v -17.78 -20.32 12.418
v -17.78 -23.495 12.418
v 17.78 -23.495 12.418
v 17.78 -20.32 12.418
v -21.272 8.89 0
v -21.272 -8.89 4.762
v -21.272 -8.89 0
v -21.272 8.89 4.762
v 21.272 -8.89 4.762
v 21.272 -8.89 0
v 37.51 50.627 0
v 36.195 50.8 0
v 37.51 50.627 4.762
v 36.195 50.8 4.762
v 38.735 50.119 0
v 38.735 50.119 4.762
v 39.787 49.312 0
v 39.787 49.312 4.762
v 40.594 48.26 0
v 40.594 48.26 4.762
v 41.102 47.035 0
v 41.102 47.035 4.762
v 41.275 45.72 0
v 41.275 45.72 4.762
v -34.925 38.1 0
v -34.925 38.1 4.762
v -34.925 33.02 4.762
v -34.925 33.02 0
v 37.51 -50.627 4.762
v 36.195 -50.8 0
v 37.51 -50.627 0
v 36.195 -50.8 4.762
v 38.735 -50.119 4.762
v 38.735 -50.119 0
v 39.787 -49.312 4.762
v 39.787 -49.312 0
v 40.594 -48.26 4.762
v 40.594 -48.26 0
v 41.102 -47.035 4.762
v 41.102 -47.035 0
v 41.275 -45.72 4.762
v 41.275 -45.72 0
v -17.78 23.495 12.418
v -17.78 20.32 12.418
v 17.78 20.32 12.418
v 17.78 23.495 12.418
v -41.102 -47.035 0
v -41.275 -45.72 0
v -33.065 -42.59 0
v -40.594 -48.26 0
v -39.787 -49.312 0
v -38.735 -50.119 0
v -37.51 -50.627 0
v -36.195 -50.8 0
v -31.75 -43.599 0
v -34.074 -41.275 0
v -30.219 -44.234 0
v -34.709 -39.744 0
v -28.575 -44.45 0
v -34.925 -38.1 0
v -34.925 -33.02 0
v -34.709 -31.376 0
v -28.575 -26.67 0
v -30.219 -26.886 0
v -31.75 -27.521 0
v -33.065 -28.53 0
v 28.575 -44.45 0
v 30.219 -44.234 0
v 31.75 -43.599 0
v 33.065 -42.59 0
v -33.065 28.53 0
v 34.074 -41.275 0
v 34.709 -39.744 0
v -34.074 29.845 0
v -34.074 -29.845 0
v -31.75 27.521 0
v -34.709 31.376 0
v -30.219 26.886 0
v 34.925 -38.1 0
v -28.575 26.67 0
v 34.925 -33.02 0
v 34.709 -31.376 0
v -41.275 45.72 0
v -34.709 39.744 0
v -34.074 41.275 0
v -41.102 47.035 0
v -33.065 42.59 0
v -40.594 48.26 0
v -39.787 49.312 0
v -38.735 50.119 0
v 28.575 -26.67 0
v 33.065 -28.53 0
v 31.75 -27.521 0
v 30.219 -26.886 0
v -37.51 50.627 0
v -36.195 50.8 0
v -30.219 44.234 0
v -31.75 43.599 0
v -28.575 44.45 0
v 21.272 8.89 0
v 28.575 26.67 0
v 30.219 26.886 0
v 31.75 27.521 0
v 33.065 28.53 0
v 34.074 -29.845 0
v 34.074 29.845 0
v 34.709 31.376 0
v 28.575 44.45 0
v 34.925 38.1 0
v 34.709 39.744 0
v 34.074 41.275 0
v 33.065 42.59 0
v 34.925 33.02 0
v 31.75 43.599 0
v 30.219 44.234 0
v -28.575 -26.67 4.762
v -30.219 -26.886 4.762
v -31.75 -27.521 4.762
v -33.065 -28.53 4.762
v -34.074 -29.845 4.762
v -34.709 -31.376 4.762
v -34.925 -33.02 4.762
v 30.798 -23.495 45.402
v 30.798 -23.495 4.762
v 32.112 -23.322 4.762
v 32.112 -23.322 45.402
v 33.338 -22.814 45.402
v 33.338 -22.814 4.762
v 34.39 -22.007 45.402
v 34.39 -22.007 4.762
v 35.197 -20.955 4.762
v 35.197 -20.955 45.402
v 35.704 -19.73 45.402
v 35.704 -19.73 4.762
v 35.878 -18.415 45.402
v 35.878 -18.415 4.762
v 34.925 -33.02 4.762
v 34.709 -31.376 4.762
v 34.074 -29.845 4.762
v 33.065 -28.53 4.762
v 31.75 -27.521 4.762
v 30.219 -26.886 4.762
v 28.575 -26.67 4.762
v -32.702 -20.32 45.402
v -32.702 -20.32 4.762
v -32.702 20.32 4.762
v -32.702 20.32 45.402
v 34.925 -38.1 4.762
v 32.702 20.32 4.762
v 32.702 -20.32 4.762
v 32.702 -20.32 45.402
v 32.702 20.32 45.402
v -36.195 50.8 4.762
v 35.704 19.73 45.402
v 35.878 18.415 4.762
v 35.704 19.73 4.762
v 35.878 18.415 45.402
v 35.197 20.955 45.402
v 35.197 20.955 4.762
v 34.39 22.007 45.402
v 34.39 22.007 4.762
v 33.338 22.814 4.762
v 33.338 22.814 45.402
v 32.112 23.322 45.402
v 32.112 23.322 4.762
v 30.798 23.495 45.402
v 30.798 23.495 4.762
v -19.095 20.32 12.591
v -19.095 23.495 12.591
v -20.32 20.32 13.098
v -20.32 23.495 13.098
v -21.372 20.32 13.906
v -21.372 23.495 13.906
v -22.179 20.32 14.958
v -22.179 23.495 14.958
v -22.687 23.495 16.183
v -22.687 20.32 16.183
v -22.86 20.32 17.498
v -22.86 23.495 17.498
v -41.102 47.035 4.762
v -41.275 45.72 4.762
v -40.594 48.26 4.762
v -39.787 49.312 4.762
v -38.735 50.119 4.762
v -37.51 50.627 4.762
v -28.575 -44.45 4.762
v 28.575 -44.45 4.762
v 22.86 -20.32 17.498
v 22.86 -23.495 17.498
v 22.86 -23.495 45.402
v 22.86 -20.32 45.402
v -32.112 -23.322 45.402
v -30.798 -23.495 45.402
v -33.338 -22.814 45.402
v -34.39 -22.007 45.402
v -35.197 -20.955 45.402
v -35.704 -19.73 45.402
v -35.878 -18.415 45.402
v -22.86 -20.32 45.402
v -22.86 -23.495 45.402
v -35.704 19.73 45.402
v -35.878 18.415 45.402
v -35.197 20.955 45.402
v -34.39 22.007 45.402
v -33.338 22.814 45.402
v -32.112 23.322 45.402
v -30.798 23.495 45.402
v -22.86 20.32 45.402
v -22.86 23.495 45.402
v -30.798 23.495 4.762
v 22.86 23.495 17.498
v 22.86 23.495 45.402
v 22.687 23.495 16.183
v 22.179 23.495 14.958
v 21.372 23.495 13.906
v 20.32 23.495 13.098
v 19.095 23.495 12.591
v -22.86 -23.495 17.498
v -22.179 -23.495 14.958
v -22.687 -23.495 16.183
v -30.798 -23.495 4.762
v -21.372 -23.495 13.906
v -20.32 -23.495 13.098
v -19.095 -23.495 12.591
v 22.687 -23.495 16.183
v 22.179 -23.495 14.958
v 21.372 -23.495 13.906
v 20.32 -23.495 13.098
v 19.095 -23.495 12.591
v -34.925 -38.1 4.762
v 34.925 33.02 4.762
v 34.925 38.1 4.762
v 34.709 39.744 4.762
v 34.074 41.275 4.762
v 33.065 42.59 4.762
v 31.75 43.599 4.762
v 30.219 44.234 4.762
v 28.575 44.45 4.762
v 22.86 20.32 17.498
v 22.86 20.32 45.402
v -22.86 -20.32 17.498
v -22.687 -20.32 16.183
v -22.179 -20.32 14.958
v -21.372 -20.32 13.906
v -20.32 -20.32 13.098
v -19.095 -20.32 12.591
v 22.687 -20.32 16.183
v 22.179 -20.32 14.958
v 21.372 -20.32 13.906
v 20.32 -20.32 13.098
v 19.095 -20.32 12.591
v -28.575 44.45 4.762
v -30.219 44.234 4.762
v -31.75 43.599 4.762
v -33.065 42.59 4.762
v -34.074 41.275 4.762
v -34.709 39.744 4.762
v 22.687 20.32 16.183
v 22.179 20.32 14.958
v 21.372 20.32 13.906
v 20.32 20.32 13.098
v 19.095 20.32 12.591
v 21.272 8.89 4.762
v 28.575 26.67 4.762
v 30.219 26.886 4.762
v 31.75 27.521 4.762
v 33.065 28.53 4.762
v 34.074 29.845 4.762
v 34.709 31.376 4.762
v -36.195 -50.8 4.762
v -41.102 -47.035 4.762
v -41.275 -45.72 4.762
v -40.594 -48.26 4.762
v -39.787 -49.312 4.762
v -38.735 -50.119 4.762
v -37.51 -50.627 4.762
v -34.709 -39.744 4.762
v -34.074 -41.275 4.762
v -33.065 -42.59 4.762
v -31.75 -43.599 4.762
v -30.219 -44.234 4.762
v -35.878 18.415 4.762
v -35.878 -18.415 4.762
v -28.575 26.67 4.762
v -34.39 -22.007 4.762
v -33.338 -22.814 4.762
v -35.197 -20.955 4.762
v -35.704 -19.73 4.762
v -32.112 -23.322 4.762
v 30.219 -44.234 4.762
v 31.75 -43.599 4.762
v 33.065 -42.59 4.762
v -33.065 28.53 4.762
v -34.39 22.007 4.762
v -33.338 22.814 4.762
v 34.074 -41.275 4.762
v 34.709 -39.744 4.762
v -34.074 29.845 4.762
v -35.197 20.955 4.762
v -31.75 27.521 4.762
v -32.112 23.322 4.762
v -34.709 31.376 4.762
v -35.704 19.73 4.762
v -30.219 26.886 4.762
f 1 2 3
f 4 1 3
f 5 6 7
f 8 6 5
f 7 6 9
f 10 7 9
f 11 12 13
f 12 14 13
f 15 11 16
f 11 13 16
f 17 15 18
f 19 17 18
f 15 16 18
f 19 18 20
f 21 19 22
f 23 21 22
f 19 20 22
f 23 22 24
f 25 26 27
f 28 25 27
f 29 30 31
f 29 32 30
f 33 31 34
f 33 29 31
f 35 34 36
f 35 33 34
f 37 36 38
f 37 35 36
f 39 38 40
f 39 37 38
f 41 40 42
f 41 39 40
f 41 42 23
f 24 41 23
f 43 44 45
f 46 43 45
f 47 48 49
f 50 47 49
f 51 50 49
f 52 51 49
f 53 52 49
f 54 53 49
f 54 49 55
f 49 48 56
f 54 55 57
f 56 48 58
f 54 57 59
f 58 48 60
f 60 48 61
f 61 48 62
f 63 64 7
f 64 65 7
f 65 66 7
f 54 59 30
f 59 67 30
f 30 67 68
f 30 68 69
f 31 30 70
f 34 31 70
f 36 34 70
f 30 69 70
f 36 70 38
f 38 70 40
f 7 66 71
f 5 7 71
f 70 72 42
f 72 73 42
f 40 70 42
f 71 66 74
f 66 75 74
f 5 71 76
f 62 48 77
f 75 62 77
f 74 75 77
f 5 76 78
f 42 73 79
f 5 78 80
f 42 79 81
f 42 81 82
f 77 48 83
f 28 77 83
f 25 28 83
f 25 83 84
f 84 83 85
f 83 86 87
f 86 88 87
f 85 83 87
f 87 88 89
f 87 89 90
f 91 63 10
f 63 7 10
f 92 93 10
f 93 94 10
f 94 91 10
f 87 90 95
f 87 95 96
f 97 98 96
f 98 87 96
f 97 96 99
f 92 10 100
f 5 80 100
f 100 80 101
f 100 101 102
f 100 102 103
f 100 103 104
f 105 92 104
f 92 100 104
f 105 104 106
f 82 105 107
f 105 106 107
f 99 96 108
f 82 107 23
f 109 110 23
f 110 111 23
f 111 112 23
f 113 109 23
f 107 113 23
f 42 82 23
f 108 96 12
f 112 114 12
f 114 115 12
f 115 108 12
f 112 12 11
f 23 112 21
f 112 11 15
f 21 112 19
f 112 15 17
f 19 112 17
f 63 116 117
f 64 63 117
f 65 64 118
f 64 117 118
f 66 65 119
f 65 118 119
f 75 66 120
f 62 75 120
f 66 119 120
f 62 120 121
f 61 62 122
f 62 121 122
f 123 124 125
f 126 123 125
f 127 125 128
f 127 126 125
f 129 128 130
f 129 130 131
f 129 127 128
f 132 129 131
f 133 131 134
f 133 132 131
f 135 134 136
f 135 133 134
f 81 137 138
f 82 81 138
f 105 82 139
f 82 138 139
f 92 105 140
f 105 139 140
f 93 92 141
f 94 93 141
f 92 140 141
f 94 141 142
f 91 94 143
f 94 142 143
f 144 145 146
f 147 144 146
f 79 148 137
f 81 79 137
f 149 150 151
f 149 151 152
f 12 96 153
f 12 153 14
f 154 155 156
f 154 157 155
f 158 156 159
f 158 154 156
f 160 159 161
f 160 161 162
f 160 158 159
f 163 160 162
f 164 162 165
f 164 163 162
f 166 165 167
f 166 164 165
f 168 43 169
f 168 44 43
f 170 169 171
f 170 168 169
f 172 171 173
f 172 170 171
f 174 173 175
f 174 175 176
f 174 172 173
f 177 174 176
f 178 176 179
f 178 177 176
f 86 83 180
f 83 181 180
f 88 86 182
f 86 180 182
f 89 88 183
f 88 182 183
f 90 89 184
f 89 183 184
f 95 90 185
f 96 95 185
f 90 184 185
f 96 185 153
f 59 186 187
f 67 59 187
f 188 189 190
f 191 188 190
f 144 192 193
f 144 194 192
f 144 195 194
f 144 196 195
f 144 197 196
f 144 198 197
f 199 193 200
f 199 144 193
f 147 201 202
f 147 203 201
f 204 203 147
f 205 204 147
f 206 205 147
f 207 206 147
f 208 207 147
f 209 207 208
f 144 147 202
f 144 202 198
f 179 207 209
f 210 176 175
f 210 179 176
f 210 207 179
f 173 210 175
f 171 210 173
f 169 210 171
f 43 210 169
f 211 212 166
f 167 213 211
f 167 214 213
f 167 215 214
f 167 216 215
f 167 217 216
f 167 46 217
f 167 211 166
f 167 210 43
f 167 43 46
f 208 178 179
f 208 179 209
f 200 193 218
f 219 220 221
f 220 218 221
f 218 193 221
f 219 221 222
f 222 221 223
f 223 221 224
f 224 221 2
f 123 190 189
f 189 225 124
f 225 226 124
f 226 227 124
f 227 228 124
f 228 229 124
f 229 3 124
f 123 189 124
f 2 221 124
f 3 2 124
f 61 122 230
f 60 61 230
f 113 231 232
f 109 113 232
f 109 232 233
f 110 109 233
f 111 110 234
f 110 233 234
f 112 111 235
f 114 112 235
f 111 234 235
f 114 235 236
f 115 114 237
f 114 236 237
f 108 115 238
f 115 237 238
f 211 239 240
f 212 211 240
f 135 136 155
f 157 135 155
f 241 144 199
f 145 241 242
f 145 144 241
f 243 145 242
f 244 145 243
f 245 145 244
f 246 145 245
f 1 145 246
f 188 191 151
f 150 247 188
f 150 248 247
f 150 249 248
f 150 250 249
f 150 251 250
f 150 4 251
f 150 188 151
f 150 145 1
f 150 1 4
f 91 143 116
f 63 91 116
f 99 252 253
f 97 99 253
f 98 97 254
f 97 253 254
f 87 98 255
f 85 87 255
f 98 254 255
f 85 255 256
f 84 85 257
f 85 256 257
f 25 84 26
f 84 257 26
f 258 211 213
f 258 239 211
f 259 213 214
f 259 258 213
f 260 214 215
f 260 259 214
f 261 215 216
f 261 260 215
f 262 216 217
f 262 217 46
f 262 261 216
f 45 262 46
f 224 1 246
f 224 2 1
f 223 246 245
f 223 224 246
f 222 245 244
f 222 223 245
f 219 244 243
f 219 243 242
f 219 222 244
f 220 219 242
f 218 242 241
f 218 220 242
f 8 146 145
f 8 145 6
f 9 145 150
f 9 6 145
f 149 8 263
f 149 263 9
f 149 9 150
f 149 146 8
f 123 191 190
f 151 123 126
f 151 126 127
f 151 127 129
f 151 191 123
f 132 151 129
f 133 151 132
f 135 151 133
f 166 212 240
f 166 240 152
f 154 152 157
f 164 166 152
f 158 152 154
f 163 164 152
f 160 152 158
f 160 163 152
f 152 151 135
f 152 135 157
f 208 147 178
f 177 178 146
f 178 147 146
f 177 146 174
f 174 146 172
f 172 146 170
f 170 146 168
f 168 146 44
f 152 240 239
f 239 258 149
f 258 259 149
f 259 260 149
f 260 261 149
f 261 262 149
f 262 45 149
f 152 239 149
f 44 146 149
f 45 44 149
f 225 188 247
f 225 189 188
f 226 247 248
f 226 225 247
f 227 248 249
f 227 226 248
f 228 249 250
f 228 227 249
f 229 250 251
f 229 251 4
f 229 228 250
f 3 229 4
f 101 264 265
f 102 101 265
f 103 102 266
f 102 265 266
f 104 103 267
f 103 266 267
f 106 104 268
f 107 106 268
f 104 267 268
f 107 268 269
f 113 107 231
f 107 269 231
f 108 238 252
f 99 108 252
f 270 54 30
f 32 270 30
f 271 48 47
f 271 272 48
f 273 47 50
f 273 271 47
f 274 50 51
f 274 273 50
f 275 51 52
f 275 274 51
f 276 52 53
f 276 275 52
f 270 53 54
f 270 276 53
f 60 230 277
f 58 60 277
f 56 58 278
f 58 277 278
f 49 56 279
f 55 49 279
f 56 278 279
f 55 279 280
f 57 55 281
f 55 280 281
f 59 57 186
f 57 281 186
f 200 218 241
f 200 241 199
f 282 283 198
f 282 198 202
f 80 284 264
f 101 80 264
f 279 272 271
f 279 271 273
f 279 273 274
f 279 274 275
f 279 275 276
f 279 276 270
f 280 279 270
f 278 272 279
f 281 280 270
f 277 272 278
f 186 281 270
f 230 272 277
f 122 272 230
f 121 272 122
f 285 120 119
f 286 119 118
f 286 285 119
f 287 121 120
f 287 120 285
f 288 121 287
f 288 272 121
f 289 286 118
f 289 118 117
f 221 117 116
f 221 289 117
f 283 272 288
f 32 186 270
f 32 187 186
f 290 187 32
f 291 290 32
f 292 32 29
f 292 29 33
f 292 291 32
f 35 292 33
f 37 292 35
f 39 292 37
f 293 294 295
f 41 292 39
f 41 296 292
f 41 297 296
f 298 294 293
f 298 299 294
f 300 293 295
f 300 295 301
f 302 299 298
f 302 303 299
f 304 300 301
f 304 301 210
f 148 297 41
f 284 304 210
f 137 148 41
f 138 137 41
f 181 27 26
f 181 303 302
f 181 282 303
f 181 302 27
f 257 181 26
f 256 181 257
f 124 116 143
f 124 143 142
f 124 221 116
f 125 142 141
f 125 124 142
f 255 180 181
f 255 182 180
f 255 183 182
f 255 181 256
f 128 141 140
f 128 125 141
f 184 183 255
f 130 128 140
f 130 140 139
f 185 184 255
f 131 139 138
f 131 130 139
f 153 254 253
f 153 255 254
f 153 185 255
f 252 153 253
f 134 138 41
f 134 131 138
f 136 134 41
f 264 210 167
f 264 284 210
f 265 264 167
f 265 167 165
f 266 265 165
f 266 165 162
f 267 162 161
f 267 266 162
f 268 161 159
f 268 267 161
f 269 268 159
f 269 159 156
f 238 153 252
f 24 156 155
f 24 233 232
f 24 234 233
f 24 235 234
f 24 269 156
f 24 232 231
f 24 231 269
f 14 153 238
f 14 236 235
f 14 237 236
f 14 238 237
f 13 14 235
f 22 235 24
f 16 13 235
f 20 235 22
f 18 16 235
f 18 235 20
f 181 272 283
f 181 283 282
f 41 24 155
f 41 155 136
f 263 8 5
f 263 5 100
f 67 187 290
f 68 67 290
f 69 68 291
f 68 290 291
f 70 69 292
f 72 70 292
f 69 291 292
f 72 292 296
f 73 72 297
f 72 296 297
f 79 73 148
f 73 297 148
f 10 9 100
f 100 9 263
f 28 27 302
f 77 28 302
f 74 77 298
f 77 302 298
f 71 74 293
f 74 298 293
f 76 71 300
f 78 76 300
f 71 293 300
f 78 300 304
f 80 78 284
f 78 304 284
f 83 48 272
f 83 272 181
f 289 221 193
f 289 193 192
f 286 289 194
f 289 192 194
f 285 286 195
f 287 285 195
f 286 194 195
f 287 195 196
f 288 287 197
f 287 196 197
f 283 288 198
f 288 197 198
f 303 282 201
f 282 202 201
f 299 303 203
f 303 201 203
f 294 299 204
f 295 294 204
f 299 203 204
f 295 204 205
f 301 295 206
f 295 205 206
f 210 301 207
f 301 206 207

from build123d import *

# Parameters (mm, degrees)
F0_W      = 82.55
F0_H      = 101.6
F1_DEPTH  = 4.7625
F2_W      = 71.755
F2_H      = 46.99
F2_W_2    = 65.405
F2_H_2    = 40.64
F3_DEPTH  = 40.64
F4_W      = 45.72
F4_H      = 32.9846274108
F5_DEPTH  = 40.132
F6_R      = 5.08
F7_R      = 5.08
F9_DEPTH  = 25.4
F10_W     = 42.545
F10_H     = 17.78
F11_DEPTH = 25.4


with BuildPart() as f1:
    # F0 (on Top) → F1 (new body)
    with BuildSketch(Plane.XY):
        Rectangle(F0_W, F0_H)
    extrude(amount=F1_DEPTH)

    # F2 (on face) → F3 (join)
    with BuildSketch(Plane.XY.offset(4.7625)):
        Rectangle(F2_W, F2_H)
        Rectangle(F2_W_2, F2_H_2, mode=Mode.SUBTRACT)
    extrude(amount=F3_DEPTH)

    # F4 (on Front) → F5 (cut, symmetric)
    with BuildSketch(Plane.XZ):
        with Locations((0, 28.9101862946)):
            Rectangle(F4_W, F4_H)
    extrude(amount=F5_DEPTH, both=True, mode=Mode.SUBTRACT)

    # F6
    f6_edges = [f1.edges().sort_by_distance(p)[0] for p in [
        (-22.86, 21.9075, 12.417873),
        (-22.86, -21.9075, 12.417873),
        (22.86, 21.9075, 12.417873),
        (22.86, -21.9075, 12.417873),
    ]]
    fillet(f6_edges, radius=F6_R)

    # F7
    f7_edges = [f1.edges().sort_by_distance(p)[0] for p in [
        (-35.8775, -23.495, 25.0825),
        (-35.8775, 23.495, 25.0825),
        (35.8775, -23.495, 25.0825),
        (35.8775, 23.495, 25.0825),
        (-41.275, -50.8, 2.38125),
        (41.275, -50.8, 2.38125),
        (41.275, 50.8, 2.38125),
        (-41.275, 50.8, 2.38125),
    ]]
    fillet(f7_edges, radius=F7_R)

    # F8 (on face) → F9 (cut)
    with BuildSketch(Plane.XY.offset(4.7625)):
        with BuildLine():
            Line((28.575, 44.45), (-28.575, 44.45))
            ThreePointArc((-28.575, 44.45), (-33.0651280605, 42.5901280605), (-34.925, 38.1))
            Line((-34.925, 38.1), (-34.925, 33.02))
            ThreePointArc((-34.925, 33.02), (-33.0651280605, 28.5298719395), (-28.575, 26.67))
            Line((-28.575, 26.67), (28.575, 26.67))
            ThreePointArc((28.575, 26.67), (33.0651280605, 28.5298719395), (34.925, 33.02))
            Line((34.925, 33.02), (34.925, 38.1))
            ThreePointArc((34.925, 38.1), (33.0651280605, 42.5901280605), (28.575, 44.45))
        make_face()
        with BuildLine():
            Line((28.575, -26.67), (-28.575, -26.67))
            ThreePointArc((-28.575, -26.67), (-33.0651280605, -28.5298719395), (-34.925, -33.02))
            Line((-34.925, -33.02), (-34.925, -38.1))
            ThreePointArc((-34.925, -38.1), (-33.0651280605, -42.5901280605), (-28.575, -44.45))
            Line((-28.575, -44.45), (28.575, -44.45))
            ThreePointArc((28.575, -44.45), (33.0651280605, -42.5901280605), (34.925, -38.1))
            Line((34.925, -38.1), (34.925, -33.02))
            ThreePointArc((34.925, -33.02), (33.0651280605, -28.5298719395), (28.575, -26.67))
        make_face()
    extrude(amount=-F9_DEPTH, mode=Mode.SUBTRACT)

    # F10 (on face) → F11 (cut)
    with BuildSketch(Plane.XY.offset(4.7625)):
        Rectangle(F10_W, F10_H)
    extrude(amount=-F11_DEPTH, mode=Mode.SUBTRACT)


solid = f1.part
